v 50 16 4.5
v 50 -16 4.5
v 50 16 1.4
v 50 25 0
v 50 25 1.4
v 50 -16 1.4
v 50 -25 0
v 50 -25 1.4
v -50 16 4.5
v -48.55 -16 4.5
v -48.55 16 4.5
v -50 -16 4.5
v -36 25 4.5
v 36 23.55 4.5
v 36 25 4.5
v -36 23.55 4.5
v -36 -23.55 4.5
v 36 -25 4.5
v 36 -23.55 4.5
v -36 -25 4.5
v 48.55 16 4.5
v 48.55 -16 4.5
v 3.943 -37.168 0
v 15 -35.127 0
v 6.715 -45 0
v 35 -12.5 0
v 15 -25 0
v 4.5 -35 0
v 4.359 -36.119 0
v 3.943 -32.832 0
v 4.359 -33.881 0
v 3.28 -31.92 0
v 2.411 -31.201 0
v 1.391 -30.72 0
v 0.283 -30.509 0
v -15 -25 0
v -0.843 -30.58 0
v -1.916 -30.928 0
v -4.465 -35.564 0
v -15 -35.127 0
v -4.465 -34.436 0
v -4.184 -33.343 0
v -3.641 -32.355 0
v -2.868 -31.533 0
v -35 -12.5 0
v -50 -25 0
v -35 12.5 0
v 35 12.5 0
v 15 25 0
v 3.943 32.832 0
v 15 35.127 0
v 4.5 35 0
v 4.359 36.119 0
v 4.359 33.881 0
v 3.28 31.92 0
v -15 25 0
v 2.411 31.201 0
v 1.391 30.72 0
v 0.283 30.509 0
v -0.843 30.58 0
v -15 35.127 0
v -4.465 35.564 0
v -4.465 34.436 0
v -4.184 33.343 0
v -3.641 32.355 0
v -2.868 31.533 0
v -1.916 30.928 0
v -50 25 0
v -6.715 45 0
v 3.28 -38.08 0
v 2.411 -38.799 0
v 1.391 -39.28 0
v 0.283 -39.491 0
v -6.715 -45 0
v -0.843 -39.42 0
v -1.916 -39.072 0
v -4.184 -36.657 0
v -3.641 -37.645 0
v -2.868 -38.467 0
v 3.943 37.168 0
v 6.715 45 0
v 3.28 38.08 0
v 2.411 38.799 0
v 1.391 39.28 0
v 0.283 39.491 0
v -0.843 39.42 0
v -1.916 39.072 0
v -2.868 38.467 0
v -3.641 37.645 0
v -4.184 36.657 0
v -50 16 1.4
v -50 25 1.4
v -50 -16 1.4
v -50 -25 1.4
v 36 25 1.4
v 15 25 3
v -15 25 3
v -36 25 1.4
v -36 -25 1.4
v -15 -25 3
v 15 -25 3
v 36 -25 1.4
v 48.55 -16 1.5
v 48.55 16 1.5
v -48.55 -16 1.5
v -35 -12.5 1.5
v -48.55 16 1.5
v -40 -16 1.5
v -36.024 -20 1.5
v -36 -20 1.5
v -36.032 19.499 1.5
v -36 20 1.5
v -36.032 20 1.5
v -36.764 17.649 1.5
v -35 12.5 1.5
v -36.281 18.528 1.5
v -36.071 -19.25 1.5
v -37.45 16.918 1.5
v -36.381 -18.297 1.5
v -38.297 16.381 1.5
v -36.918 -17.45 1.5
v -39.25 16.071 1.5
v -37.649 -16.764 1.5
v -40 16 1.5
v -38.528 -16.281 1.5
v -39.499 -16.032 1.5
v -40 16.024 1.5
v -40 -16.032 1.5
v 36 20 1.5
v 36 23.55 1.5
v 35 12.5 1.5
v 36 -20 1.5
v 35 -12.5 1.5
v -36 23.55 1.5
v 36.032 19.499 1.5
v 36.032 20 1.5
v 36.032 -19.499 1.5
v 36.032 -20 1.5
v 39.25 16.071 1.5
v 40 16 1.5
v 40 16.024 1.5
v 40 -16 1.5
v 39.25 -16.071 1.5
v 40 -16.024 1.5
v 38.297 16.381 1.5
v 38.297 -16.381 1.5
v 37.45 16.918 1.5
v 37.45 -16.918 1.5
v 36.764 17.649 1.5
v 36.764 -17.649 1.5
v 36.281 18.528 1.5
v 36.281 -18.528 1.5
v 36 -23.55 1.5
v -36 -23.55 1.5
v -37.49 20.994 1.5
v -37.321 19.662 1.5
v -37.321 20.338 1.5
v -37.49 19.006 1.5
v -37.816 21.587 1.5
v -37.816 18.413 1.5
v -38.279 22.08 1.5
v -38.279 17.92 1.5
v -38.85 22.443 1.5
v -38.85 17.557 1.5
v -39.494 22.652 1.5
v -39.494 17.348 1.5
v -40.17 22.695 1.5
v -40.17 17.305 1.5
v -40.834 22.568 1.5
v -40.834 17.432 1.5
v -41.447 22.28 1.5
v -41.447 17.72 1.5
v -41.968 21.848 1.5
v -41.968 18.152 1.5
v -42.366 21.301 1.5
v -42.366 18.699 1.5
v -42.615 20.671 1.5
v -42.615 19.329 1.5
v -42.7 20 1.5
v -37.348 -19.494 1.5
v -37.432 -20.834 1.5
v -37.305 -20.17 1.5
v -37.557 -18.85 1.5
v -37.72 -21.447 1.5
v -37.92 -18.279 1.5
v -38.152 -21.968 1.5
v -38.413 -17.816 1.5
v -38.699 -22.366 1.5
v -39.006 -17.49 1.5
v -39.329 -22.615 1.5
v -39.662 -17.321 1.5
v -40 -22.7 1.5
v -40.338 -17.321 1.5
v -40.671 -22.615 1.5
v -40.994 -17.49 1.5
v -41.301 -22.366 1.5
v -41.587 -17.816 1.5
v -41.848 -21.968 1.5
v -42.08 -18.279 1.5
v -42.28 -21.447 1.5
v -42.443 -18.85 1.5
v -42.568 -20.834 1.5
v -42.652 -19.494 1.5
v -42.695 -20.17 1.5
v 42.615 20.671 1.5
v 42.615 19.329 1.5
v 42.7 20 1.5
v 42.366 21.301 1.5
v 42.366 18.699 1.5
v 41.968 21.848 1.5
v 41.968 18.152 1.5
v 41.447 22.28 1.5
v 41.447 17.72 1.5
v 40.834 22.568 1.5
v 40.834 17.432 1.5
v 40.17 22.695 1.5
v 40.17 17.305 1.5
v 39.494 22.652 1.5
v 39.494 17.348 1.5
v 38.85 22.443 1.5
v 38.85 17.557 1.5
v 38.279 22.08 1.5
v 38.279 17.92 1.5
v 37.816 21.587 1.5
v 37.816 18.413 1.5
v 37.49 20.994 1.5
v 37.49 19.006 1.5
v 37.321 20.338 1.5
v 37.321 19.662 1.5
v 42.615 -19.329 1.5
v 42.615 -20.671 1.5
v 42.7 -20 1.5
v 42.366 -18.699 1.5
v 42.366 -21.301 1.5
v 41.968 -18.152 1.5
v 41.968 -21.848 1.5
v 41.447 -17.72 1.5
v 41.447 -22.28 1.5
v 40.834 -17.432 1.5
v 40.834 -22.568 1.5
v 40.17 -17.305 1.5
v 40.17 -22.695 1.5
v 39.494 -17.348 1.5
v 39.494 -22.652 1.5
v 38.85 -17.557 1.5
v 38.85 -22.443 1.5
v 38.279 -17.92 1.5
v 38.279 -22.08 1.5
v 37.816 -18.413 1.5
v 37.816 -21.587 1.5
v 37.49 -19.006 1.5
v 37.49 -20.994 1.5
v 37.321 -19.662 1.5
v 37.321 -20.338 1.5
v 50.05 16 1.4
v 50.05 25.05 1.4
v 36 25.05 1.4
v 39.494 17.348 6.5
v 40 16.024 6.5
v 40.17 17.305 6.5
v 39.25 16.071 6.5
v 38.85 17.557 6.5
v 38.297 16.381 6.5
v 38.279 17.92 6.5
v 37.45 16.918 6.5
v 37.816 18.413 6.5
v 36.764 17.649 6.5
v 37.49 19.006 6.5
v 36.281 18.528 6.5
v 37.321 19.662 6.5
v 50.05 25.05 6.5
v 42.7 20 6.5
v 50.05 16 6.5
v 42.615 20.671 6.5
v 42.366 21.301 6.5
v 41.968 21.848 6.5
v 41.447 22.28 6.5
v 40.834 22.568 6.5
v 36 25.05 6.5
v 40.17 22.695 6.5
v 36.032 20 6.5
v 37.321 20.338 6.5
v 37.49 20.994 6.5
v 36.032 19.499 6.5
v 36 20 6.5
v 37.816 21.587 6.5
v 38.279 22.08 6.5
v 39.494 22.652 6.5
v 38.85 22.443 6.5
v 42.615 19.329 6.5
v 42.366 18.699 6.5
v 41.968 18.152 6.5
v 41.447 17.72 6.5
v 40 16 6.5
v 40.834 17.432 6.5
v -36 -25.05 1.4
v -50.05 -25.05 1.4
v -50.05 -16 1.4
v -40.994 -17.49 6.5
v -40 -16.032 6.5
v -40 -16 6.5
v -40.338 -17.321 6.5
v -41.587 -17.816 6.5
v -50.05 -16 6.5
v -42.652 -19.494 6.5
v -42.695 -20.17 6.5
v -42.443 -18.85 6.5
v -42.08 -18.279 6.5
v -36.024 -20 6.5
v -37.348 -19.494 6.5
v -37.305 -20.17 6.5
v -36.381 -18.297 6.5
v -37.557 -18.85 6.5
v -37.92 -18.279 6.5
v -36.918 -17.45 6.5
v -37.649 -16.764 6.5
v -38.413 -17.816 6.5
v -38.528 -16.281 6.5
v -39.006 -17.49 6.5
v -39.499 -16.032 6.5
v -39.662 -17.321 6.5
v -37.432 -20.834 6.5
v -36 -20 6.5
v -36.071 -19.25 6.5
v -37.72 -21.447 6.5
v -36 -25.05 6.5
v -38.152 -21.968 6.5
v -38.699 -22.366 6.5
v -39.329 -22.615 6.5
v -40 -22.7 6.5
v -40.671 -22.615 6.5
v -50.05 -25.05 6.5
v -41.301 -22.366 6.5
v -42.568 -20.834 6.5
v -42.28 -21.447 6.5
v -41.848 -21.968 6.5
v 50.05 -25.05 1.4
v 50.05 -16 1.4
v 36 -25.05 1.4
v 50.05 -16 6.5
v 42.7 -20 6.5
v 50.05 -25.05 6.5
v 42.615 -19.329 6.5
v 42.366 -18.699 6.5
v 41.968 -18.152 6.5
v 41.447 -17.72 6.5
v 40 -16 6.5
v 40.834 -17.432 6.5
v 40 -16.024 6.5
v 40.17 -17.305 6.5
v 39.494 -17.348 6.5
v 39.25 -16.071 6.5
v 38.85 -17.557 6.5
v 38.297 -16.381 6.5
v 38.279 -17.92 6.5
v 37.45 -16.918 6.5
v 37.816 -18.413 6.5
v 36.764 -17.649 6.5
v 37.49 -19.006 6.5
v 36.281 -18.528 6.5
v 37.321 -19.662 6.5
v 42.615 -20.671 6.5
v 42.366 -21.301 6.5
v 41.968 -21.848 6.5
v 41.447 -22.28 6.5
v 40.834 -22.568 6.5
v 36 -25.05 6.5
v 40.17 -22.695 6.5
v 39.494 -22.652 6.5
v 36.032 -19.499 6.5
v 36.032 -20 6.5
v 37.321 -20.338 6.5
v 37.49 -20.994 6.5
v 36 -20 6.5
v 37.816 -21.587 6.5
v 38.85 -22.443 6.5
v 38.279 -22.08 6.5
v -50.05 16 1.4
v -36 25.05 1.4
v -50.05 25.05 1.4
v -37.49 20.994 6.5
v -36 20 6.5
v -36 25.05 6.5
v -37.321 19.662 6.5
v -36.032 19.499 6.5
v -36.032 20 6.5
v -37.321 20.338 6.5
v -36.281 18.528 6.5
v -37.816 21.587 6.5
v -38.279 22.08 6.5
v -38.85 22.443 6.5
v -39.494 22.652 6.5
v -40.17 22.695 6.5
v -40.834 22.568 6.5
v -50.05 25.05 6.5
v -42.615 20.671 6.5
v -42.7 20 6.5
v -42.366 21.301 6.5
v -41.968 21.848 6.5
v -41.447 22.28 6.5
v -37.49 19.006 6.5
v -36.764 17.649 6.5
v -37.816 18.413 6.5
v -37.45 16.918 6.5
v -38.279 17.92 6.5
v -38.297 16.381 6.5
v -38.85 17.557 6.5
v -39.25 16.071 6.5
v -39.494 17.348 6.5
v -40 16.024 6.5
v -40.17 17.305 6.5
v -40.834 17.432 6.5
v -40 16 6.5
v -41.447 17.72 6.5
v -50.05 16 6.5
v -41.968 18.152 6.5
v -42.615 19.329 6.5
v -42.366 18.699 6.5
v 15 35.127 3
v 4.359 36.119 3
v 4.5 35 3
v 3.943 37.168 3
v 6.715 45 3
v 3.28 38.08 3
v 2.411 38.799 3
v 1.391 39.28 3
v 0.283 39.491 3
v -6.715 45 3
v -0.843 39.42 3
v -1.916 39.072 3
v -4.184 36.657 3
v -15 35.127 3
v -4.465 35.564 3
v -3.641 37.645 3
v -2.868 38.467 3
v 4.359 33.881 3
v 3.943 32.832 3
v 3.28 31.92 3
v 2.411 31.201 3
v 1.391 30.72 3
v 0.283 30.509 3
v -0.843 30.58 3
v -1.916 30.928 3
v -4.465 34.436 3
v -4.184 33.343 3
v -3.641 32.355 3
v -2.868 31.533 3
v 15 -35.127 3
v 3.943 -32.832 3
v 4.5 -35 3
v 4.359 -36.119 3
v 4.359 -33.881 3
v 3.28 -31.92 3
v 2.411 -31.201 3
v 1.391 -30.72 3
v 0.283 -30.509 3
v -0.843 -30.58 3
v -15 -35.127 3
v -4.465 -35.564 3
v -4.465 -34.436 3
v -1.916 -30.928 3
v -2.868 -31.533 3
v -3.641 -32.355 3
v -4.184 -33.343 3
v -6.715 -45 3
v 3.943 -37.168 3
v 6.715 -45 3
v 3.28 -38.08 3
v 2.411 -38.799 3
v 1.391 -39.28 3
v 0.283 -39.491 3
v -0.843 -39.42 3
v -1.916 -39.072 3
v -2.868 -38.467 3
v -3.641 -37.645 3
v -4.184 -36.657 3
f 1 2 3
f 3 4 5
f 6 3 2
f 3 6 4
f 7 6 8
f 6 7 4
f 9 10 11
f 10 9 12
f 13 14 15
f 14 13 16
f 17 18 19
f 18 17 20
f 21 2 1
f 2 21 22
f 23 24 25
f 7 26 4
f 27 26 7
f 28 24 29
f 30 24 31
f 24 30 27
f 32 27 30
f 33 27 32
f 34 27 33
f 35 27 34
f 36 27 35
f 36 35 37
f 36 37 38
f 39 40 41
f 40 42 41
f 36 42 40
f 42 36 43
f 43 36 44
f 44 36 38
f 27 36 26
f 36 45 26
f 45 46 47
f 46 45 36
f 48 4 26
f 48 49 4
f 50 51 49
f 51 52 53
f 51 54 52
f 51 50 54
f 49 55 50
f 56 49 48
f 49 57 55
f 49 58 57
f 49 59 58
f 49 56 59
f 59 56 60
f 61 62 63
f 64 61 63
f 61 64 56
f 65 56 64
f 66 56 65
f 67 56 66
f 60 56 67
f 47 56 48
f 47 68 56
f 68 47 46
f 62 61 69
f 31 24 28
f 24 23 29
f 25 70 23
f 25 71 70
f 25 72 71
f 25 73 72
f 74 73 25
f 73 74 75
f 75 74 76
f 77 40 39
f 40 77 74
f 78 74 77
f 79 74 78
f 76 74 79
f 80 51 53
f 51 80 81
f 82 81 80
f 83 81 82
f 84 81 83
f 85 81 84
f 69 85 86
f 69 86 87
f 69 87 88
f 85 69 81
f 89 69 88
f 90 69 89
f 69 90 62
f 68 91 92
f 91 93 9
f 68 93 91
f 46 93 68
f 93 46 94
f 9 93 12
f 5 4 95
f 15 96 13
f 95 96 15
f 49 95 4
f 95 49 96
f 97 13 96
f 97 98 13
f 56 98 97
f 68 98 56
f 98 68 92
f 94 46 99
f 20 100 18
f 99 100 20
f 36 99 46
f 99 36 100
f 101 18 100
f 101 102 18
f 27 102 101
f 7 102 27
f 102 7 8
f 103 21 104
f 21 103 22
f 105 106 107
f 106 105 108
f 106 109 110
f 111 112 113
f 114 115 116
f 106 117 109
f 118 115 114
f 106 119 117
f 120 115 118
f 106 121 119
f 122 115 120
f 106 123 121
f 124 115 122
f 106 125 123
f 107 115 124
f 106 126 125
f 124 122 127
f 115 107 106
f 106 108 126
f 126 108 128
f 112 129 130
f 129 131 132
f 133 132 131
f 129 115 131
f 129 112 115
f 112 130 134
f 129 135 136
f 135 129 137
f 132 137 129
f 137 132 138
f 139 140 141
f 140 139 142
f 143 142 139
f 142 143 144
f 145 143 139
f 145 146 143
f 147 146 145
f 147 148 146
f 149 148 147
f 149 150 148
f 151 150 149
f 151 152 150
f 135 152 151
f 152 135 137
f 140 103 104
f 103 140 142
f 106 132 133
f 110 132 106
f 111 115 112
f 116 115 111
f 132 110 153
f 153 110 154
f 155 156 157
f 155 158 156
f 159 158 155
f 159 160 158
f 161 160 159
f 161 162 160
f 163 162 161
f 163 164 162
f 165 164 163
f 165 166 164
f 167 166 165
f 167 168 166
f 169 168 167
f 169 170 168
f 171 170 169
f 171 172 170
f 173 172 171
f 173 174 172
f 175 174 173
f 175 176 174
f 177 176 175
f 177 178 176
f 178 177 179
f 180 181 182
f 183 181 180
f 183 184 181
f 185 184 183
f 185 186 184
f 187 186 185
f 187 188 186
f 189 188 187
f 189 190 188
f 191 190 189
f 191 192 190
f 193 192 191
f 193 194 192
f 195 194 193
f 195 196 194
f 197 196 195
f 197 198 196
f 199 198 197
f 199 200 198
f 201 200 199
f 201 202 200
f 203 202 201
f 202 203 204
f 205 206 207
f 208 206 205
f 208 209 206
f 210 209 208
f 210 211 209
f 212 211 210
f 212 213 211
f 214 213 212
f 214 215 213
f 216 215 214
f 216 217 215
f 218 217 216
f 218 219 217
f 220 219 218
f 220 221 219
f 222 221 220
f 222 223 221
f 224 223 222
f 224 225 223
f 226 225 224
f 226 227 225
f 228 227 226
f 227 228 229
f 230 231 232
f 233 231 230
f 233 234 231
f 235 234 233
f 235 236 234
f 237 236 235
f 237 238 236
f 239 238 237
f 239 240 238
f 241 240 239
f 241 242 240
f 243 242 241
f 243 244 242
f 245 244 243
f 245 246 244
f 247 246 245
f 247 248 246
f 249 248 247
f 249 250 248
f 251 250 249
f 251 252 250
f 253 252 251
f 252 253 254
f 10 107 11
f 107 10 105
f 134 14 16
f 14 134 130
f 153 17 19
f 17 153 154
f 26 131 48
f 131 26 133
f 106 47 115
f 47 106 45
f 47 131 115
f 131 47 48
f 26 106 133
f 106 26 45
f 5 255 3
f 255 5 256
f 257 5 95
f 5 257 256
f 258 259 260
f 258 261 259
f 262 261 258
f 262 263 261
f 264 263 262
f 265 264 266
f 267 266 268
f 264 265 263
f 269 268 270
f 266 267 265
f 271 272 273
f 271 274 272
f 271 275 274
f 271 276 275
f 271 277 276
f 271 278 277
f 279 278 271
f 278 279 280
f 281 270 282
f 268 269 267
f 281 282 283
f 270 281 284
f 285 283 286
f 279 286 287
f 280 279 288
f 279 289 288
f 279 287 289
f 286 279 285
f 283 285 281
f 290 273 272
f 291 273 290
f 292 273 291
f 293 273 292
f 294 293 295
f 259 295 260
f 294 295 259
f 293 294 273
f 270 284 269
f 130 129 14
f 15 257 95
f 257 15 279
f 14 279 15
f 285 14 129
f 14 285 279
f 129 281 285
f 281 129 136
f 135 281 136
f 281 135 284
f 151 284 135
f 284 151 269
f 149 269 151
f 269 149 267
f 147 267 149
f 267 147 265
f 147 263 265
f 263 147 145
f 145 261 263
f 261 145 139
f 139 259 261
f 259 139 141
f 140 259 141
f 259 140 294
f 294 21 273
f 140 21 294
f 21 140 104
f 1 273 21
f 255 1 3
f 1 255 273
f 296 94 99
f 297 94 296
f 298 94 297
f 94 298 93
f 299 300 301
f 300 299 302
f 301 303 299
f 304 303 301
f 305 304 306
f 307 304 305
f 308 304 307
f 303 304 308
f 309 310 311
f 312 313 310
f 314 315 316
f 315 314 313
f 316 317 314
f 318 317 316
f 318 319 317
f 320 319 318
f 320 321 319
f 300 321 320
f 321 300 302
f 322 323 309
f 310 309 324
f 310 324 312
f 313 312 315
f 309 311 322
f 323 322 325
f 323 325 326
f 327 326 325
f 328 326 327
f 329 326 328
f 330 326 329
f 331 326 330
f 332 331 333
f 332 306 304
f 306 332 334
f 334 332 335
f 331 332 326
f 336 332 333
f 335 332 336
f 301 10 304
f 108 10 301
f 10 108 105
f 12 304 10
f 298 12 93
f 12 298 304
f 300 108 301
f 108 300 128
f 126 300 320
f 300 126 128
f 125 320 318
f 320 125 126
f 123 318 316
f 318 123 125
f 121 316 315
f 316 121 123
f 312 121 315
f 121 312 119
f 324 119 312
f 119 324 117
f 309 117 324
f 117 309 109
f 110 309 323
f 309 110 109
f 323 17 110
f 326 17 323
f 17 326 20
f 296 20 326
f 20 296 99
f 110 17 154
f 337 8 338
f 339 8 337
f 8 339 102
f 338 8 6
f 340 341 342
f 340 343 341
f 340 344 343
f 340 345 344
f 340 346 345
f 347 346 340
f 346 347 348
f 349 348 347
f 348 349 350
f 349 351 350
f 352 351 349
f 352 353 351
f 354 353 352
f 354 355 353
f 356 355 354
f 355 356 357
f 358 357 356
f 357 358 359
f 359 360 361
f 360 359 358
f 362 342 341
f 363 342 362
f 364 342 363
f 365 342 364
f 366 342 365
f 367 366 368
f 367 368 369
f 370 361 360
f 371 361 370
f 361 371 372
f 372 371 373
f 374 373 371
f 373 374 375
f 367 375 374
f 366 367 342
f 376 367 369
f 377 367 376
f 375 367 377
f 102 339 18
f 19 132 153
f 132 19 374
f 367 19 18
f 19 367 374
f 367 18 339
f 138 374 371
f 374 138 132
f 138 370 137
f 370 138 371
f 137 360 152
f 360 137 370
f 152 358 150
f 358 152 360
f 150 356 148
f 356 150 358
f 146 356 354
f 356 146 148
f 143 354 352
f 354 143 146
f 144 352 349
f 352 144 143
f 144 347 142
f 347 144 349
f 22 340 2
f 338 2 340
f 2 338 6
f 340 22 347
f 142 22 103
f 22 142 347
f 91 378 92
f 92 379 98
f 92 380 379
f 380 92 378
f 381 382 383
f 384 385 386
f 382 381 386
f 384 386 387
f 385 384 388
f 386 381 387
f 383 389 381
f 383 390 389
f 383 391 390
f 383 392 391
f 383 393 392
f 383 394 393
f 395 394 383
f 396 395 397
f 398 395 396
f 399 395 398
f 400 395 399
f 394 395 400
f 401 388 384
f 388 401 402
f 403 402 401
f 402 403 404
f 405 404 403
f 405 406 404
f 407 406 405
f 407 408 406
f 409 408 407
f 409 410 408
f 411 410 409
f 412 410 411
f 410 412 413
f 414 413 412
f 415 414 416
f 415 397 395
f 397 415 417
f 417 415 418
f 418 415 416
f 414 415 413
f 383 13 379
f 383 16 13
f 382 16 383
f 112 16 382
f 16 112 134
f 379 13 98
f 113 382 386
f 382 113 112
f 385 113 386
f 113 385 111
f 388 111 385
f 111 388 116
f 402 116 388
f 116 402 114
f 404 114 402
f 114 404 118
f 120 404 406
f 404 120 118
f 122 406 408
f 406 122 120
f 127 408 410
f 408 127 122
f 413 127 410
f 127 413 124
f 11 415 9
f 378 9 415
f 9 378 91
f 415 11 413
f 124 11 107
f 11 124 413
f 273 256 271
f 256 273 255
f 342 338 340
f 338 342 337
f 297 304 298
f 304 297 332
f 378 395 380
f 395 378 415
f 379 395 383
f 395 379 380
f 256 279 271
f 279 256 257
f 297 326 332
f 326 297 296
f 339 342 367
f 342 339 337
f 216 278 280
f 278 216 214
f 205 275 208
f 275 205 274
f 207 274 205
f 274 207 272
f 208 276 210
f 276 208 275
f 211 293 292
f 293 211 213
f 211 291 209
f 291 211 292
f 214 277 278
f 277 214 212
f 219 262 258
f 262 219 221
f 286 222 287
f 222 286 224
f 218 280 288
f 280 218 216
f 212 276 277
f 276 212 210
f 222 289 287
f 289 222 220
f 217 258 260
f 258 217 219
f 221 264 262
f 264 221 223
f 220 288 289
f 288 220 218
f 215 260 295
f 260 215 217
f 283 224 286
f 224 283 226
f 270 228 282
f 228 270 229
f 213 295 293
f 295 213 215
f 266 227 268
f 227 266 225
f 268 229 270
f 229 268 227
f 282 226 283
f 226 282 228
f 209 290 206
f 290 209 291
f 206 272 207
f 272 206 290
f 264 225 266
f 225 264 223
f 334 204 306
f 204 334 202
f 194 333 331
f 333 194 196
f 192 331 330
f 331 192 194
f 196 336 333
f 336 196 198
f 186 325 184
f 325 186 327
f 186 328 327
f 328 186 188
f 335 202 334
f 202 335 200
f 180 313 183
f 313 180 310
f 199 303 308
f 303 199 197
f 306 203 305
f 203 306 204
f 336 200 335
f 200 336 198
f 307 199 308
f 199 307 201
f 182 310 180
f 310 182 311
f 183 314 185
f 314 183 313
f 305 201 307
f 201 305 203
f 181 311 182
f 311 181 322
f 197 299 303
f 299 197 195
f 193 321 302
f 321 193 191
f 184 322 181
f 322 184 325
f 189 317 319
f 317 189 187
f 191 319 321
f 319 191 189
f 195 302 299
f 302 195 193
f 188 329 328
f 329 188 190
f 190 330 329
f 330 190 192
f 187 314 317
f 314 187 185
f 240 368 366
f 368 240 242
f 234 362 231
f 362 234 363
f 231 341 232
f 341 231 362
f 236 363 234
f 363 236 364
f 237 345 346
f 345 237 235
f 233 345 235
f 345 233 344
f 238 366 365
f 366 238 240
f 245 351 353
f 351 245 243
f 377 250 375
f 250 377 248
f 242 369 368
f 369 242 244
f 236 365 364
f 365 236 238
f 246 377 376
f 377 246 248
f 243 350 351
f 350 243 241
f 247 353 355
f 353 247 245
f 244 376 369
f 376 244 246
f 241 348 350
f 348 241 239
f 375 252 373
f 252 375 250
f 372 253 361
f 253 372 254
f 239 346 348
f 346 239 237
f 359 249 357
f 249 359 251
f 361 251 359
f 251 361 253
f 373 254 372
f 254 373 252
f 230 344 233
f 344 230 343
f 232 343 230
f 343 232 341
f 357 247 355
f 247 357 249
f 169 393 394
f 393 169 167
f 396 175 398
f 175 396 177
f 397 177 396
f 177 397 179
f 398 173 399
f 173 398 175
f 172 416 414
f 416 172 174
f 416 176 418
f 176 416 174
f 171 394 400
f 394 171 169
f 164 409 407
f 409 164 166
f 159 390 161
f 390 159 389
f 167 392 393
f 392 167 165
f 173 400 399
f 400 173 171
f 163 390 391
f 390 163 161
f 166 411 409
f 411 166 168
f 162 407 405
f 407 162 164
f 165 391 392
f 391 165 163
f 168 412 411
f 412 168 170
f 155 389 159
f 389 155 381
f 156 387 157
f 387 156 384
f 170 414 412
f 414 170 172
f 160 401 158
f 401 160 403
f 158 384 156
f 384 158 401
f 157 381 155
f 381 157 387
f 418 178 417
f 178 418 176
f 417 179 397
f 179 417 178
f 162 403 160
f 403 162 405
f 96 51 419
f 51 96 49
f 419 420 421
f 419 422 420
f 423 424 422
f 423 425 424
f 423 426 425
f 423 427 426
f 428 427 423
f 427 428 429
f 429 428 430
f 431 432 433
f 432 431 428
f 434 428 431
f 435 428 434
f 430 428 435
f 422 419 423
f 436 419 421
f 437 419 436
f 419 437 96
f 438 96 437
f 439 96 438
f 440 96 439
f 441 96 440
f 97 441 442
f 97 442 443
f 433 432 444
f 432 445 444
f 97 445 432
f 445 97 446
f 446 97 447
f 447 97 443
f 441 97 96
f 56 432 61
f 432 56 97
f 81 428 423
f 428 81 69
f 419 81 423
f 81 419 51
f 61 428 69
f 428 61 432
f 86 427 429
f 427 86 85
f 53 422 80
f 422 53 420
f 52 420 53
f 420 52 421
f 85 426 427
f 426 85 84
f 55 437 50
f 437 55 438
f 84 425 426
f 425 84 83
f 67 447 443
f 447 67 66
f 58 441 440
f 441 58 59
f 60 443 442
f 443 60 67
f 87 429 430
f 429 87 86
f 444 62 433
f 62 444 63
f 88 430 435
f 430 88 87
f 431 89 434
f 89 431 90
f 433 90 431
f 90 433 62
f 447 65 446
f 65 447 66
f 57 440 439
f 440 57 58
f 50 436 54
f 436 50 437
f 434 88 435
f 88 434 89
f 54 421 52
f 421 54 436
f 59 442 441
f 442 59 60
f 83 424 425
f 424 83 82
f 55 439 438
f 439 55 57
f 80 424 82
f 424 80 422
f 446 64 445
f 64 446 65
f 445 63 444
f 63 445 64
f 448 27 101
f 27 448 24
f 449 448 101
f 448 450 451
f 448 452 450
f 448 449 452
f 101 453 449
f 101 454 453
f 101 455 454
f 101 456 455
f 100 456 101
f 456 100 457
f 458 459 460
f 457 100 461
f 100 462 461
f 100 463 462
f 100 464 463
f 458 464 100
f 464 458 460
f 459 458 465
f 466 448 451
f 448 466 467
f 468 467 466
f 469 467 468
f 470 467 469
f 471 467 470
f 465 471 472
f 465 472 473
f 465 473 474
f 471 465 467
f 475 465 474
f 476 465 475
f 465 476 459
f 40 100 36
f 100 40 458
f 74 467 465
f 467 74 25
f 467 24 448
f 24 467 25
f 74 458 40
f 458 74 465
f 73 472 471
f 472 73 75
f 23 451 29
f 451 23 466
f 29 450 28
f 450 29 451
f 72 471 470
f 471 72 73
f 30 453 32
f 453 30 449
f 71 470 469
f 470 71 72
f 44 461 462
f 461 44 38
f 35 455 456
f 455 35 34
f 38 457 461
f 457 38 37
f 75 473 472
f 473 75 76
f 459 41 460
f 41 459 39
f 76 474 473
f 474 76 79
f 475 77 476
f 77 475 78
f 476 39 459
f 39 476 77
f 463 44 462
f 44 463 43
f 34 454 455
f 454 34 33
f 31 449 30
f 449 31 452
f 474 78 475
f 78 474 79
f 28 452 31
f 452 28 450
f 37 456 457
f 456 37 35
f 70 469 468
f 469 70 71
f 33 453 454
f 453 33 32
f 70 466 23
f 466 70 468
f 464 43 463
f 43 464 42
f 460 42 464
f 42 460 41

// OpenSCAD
/* A small, arbitrary unit to guard against rounding errors */
eps = 0.1;
alot = 1000;

/* Base PCB size */
pcb_width = 90;
pcb_height = 50;

bottom_thickness = 1.5;

screw_base_dia = 8;
screw_base_h = 5;
screw_nut_dia = 5.4;
screw_nut_h = 6;
screw_hole_dia = 3.5;
screw_hole_h = 6;

module rounded_rect(w, h, r) {
    hull(){
        translate([w/2-r, h/2-r]) circle(r);
        translate([-(w/2-r), h/2-r]) circle(r);
        translate([w/2-r, -(h/2-r)]) circle(r);
        translate([-(w/2-r), -(h/2-r)]) circle(r);
    }
}

module single_screw_base() {
    translate([0, 0, bottom_thickness-eps]) linear_extrude(height=screw_base_h+eps) {
        circle(d=screw_base_dia);
        translate([-screw_base_dia/2, 0]) square([alot, alot]);
        translate([0, -screw_base_dia/2]) square([alot, alot]);
    }
}

w = pcb_width+10;
h = pcb_height;
l = 10;
r = 10;
t = 5;
b = 5;
s1_pos = [ w/2-l,  h/2-b];
s2_pos = [-w/2+r, -h/2+t];
s3_pos = [ w/2-l, -h/2+t];
s4_pos = [-w/2+r,  h/2-b];
module screw_bases() {
    intersection() {
        union() {
            translate(s1_pos) single_screw_base();
            translate(s2_pos) mirror([1,1,0]) single_screw_base();
            translate(s3_pos) mirror([0,1,0]) single_screw_base();
            translate(s4_pos) mirror([1,0,0]) single_screw_base();
        }
        cube([w+eps, h+eps, alot], center=true);
    }
}


module single_screw_hole() {
    translate([0, 0, bottom_thickness+screw_base_h+eps])
    mirror([0,0,1])
    union() {
        cylinder(h=screw_nut_h+eps, d=screw_nut_dia);
        cylinder(h=screw_hole_h+eps, d=screw_hole_dia);
    }
}

module screw_holes() {
    translate(s1_pos) single_screw_hole();
    translate(s2_pos) mirror([1,1,0]) single_screw_hole();
    translate(s3_pos) mirror([0,1,0]) single_screw_hole();
    translate(s4_pos) mirror([1,0,0]) single_screw_hole();
}

tab_w = 20;
tab_h = 30;
tab_thickness = 3;
tab_hole_d = 9;
module screw_tab() {
    difference() {
        translate([-tab_h/2, -eps, 0]) cube([tab_h, tab_w+eps, tab_thickness]);
        rotate([0, 0, -50]) translate([-alot/2, tab_h*0.6, -eps]) cube([alot, alot, tab_h+2*eps]);
        rotate([0, 0, 50]) translate([-alot/2, tab_h*0.6, -eps]) cube([alot, alot, tab_thickness+2*eps]);
        translate([0, tab_w/2, -eps]) cylinder(d=tab_hole_d, h=tab_thickness+eps*2);
    }
}

wall_height = bottom_thickness + 3;
wall_thickness = 1.5;

cutout_w = 25;
cutout_h = 70;

module carrier() {
    union() {
        difference() {
            translate([0, 0, wall_height/2]) cube([w, h, wall_height], center=true);
            translate([0, 0, bottom_thickness + alot/2]) cube([w-wall_thickness*2+eps, h-wall_thickness*2+eps, alot], center=true);
            cube([cutout_h, cutout_w, alot], center=true);
        }
        difference() {
            screw_bases();
            screw_holes();
        }
        translate([0, h/2, 0]) screw_tab();
        mirror([0,1,0]) translate([0, h/2, 0]) screw_tab();
    }
}

carrier($fn=25);
